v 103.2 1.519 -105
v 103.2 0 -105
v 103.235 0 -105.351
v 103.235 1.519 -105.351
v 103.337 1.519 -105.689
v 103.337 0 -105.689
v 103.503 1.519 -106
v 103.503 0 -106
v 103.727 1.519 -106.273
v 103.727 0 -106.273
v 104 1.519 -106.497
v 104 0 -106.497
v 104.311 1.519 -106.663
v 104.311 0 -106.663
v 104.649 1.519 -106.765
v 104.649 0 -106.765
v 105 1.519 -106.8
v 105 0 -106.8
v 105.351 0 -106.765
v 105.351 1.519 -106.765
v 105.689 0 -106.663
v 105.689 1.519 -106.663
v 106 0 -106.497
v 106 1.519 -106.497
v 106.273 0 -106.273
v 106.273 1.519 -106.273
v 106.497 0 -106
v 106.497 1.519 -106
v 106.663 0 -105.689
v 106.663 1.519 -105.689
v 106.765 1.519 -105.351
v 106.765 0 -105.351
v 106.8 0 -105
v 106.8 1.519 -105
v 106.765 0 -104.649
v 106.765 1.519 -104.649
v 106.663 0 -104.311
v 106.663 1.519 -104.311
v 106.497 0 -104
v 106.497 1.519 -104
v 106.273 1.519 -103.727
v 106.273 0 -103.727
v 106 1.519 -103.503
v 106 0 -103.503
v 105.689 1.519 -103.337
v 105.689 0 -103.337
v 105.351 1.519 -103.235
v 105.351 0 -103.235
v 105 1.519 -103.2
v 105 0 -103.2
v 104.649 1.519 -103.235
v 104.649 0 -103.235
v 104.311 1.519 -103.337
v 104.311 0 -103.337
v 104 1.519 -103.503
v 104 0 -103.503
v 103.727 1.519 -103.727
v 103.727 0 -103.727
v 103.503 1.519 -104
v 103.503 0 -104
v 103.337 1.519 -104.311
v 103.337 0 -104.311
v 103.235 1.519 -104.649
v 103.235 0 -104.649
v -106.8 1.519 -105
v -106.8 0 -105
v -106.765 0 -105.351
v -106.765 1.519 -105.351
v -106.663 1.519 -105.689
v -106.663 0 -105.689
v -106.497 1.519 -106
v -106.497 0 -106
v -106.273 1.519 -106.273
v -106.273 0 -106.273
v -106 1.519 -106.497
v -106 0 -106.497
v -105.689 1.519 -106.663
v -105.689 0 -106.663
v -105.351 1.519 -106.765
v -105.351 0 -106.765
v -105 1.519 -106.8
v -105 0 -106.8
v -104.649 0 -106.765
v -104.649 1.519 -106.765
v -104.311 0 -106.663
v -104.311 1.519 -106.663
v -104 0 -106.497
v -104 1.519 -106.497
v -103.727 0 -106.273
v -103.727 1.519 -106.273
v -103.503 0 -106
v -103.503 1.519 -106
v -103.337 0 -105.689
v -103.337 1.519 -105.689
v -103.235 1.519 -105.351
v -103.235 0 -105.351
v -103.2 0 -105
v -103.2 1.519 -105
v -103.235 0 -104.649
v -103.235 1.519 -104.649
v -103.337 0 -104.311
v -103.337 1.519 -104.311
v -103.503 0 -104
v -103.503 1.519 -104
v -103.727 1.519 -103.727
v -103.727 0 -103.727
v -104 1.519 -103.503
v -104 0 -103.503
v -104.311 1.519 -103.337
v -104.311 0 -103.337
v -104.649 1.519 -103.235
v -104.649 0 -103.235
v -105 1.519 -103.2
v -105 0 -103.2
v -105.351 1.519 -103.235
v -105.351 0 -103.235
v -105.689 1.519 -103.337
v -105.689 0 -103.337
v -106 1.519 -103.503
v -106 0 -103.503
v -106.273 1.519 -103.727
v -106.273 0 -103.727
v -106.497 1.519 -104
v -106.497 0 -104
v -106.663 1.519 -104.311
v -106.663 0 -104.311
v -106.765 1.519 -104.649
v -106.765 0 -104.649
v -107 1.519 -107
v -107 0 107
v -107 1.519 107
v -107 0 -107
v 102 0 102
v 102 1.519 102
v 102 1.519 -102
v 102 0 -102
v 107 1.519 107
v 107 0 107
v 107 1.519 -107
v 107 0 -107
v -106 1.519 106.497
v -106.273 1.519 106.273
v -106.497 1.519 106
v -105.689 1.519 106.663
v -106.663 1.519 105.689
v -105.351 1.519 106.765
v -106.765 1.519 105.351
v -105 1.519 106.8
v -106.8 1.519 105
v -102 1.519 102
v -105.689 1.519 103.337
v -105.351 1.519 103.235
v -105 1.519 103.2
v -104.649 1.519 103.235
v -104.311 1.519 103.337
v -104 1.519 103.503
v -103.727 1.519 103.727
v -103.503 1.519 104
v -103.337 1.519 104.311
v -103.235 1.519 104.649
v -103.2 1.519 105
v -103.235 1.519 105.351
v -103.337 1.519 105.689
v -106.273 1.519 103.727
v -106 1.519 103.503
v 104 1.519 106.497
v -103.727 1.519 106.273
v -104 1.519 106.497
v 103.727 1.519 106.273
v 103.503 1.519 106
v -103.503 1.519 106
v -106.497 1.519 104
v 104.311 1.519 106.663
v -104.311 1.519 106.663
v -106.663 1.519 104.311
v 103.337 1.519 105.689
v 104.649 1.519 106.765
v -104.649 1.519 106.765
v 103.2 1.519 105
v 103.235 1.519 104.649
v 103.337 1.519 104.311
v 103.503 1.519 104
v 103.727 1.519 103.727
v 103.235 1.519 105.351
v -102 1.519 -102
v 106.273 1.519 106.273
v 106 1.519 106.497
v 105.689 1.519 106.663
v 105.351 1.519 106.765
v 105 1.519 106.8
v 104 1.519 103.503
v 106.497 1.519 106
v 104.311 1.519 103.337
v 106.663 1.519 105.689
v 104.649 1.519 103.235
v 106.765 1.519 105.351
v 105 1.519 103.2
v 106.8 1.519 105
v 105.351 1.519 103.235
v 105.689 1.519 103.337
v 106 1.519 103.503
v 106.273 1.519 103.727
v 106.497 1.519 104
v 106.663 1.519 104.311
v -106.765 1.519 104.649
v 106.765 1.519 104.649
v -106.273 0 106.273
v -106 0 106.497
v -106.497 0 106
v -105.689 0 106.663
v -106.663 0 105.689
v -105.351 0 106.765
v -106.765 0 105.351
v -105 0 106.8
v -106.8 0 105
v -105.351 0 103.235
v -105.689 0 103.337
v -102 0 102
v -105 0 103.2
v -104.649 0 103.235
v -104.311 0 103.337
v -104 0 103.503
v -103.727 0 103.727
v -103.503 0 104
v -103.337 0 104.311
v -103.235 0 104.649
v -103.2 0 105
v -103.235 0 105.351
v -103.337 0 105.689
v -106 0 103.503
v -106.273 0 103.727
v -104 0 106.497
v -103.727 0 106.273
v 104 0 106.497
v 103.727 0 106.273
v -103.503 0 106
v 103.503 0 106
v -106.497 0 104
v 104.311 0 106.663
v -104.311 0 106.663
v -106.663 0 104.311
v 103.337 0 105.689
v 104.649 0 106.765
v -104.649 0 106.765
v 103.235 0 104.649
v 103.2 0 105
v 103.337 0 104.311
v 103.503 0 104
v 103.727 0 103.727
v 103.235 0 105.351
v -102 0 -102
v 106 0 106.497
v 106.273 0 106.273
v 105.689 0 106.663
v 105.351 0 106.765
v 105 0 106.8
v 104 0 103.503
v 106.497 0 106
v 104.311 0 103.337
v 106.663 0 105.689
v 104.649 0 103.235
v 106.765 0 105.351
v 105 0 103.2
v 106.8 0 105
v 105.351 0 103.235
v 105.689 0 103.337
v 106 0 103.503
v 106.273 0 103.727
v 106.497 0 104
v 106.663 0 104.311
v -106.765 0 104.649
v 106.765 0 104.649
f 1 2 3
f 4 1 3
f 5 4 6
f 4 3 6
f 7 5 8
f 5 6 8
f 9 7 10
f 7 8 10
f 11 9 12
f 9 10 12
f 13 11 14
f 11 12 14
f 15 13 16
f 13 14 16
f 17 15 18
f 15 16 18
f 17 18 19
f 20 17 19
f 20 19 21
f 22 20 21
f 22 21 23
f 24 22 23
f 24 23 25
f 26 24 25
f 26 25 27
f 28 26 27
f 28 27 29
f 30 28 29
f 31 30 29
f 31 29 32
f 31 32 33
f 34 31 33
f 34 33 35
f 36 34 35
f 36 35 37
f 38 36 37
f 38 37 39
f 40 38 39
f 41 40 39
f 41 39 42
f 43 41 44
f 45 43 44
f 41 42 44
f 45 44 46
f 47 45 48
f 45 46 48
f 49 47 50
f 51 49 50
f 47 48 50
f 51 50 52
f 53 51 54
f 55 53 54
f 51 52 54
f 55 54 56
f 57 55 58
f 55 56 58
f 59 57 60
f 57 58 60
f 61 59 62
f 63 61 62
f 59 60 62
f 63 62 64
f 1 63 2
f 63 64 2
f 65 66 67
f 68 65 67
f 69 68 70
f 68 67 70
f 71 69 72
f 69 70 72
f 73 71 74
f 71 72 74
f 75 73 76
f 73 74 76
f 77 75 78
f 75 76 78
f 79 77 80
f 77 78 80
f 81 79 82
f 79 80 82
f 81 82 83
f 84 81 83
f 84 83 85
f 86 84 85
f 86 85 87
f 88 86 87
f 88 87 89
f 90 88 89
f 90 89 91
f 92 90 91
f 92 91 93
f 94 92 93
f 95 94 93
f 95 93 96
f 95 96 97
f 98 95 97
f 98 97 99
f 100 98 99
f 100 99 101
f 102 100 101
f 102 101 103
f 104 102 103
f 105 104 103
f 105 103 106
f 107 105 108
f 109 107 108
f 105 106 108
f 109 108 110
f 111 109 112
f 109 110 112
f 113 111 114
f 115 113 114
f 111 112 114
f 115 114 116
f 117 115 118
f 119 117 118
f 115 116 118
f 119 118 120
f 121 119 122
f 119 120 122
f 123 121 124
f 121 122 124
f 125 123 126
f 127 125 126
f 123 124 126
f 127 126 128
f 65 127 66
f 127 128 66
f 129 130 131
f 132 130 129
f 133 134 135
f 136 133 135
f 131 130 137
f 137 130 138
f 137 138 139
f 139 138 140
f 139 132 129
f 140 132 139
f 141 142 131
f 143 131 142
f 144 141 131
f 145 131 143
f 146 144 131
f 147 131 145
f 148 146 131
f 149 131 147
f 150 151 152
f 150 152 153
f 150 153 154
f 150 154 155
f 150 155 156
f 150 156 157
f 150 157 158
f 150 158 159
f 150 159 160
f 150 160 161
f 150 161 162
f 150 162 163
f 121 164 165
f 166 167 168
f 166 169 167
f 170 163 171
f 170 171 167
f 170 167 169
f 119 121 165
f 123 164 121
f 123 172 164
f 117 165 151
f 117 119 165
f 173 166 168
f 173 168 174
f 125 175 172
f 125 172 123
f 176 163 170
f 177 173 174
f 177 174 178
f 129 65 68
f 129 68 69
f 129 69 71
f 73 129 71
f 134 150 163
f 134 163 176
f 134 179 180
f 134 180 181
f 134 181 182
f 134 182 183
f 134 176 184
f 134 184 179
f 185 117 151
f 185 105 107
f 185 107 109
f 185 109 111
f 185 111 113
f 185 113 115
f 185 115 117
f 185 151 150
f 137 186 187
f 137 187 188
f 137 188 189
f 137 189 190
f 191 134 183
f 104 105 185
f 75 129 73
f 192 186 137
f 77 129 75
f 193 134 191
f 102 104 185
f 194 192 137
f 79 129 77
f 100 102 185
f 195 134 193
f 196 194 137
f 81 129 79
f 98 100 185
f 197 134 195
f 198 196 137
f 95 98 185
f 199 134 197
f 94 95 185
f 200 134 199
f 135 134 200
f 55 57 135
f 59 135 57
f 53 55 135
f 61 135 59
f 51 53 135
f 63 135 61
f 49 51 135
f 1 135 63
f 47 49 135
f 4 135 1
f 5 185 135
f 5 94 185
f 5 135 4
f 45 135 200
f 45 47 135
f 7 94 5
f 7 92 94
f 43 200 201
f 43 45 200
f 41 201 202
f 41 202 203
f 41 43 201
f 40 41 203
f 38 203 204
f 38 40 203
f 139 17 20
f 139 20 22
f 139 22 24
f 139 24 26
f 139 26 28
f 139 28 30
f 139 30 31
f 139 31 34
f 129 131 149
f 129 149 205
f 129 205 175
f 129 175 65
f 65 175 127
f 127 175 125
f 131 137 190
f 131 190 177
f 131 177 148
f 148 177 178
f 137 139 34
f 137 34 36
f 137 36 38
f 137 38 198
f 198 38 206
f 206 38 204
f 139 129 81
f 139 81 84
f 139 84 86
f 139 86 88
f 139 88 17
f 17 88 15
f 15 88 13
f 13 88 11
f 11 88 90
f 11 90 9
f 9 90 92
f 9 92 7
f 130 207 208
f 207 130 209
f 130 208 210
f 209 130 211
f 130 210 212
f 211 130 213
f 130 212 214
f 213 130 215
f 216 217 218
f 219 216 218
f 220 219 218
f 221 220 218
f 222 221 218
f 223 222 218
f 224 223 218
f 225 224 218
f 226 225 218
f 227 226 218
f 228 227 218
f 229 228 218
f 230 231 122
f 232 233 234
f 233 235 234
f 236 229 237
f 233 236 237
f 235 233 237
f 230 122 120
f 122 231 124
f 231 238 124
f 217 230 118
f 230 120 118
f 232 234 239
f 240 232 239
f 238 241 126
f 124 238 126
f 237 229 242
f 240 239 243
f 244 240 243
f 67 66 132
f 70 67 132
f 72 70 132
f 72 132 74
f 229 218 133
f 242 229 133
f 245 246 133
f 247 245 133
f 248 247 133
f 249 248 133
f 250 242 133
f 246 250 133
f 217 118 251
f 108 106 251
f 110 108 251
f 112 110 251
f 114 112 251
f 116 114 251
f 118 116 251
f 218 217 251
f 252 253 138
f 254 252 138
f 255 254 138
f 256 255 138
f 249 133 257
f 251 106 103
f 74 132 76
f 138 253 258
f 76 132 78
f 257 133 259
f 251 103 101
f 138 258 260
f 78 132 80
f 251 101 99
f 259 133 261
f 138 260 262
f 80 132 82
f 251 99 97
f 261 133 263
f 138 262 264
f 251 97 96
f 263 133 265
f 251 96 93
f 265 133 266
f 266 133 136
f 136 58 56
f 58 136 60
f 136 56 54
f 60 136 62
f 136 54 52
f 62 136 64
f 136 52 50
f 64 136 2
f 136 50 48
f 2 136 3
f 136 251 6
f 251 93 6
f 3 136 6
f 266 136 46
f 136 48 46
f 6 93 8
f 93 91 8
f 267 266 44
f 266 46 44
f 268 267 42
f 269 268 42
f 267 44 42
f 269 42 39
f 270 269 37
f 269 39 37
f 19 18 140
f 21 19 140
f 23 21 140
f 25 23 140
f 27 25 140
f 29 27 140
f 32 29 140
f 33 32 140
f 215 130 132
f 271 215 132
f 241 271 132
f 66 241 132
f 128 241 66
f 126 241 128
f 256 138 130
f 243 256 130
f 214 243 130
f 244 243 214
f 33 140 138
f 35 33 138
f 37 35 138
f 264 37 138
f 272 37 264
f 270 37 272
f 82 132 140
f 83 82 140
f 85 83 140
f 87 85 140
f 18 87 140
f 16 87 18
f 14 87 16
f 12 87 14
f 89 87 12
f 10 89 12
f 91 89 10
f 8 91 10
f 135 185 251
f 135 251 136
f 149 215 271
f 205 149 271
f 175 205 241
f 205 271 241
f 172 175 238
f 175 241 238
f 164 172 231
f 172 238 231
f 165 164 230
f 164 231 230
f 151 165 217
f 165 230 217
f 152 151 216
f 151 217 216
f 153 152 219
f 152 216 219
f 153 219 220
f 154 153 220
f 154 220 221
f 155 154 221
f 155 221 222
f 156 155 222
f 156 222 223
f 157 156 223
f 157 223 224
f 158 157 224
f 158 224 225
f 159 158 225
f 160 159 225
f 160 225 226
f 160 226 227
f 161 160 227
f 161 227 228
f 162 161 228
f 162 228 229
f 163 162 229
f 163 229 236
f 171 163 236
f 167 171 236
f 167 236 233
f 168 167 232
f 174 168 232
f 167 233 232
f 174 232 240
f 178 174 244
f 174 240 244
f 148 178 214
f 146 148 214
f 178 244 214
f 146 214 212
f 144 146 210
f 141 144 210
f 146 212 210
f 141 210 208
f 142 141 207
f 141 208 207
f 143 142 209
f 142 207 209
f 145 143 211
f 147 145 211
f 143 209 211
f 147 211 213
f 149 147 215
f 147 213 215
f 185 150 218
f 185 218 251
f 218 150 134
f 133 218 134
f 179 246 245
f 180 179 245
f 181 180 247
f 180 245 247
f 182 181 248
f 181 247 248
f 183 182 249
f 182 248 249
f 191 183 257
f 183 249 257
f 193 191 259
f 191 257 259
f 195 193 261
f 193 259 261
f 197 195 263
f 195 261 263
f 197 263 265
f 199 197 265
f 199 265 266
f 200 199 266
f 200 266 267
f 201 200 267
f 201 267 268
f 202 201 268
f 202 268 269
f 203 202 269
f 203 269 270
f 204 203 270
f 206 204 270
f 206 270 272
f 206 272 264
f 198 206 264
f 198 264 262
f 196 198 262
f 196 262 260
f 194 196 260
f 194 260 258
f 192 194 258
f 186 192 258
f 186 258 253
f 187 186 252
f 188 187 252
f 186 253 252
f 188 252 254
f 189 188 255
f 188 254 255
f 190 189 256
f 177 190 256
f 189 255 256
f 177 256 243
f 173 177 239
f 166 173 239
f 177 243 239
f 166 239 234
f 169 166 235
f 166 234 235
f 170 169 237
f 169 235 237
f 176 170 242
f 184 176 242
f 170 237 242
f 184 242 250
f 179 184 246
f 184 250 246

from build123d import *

# Parameters (mm, degrees)
SKETCH1_W            = 214
SKETCH1_H            = 214
BOSS_EXTRUDE1_DEPTH  = 1.51892
SKETCH2_W            = 204
SKETCH2_H            = 204
CUT_EXTRUDE1_DEPTH   = 1.51892
M3_CLEARANCE_HOLE1_D = 3.6


with BuildPart() as part:
    # Sketch1 → Boss-Extrude1 (new body)
    with BuildSketch(Plane(origin=(0, 0, 0), x_dir=(1, 0, 0), z_dir=(0, 1, 0))):
        Rectangle(SKETCH1_W, SKETCH1_H)
    extrude(amount=BOSS_EXTRUDE1_DEPTH)

    # Sketch2 → Cut-Extrude1 (cut)
    with BuildSketch(Plane(origin=(0, 1.51892, 0), x_dir=(1, 0, 0), z_dir=(0, 1, 0))):
        Rectangle(SKETCH2_W, SKETCH2_H)
    extrude(amount=-CUT_EXTRUDE1_DEPTH, mode=Mode.SUBTRACT)

    # M3 Clearance Hole1 (through all)
    with Locations(Plane(origin=(0, 1.51892, 0), x_dir=(1, 0, 0), z_dir=(0, 1, 0))):
        with Locations((-105, 105), (105, 105), (105, -105), (-105, -105)):
            Hole(M3_CLEARANCE_HOLE1_D / 2)


solid = part.part
